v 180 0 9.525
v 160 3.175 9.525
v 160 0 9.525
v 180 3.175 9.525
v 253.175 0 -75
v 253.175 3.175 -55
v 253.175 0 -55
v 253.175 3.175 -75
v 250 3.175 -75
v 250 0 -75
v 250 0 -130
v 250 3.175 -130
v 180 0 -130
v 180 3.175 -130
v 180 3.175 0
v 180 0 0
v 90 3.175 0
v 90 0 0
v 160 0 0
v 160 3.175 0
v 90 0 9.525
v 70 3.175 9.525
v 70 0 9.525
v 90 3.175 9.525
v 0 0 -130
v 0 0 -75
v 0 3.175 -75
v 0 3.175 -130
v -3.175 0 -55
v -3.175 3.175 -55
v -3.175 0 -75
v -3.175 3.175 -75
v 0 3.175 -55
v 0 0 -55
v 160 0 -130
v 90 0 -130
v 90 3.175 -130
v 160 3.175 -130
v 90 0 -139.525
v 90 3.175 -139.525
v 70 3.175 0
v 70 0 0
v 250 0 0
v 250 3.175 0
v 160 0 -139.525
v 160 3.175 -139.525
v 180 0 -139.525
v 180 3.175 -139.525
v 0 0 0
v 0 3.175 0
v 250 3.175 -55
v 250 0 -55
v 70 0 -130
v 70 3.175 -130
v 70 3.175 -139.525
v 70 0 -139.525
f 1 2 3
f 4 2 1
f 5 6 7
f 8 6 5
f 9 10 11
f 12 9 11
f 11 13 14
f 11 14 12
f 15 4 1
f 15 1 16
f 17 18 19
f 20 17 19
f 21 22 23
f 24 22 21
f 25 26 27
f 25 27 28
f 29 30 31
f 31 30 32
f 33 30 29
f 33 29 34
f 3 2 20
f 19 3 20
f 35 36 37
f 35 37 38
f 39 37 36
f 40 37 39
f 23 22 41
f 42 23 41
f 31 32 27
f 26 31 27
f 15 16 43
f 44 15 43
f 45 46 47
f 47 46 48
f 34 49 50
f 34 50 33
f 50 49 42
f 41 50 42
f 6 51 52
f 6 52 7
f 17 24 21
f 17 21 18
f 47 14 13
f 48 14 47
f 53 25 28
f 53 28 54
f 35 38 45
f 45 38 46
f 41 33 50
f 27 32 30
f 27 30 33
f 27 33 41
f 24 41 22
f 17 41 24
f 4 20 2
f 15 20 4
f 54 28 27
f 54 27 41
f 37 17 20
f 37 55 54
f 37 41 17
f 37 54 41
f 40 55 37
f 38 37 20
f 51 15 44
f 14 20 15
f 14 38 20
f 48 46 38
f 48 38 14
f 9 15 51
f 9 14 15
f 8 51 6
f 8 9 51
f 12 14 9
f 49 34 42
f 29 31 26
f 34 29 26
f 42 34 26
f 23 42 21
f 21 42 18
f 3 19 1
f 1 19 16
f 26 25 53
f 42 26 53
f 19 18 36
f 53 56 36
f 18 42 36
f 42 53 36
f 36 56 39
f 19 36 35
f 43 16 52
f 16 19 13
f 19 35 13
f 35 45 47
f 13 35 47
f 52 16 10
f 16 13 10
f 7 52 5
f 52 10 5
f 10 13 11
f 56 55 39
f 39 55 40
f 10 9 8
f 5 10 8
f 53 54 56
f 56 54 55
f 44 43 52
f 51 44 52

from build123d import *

# Parameters (mm, degrees)
ESQUISSE1_W        = 250
ESQUISSE1_H        = 130
BOSS_EXTRU_1_DEPTH = 3.175
ESQUISSE2_W        = 3.175
ESQUISSE2_H        = 20
ESQUISSE2_W_2      = 20
ESQUISSE2_H_2      = 9.525
BOSS_EXTRU_2_DEPTH = 3.175


with BuildPart() as part:
    # Esquisse1 → Boss.-Extru.1 (new body)
    with BuildSketch(Plane(origin=(0, 0, 0), x_dir=(1, 0, 0), z_dir=(0, 1, 0))):
        with Locations((125, 65)):
            Rectangle(ESQUISSE1_W, ESQUISSE1_H)
    extrude(amount=BOSS_EXTRU_1_DEPTH)

    # Esquisse2 → Boss.-Extru.2 (add)
    with BuildSketch(Plane(origin=(0, 3.175, 0), x_dir=(1, 0, 0), z_dir=(0, 1, 0))):
        with Locations((-1.5875, 65)):
            Rectangle(ESQUISSE2_W, ESQUISSE2_H)
        with Locations((251.5875, 65)):
            Rectangle(ESQUISSE2_W, ESQUISSE2_H)
        with Locations((80, 134.7625)):
            Rectangle(ESQUISSE2_W_2, ESQUISSE2_H_2)
        with Locations((170, 134.7625)):
            Rectangle(ESQUISSE2_W_2, ESQUISSE2_H_2)
        with Locations((170, -4.7625)):
            Rectangle(ESQUISSE2_W_2, ESQUISSE2_H_2)
        with Locations((80, -4.7625)):
            Rectangle(ESQUISSE2_W_2, ESQUISSE2_H_2)
    extrude(amount=-BOSS_EXTRU_2_DEPTH)


solid = part.part
